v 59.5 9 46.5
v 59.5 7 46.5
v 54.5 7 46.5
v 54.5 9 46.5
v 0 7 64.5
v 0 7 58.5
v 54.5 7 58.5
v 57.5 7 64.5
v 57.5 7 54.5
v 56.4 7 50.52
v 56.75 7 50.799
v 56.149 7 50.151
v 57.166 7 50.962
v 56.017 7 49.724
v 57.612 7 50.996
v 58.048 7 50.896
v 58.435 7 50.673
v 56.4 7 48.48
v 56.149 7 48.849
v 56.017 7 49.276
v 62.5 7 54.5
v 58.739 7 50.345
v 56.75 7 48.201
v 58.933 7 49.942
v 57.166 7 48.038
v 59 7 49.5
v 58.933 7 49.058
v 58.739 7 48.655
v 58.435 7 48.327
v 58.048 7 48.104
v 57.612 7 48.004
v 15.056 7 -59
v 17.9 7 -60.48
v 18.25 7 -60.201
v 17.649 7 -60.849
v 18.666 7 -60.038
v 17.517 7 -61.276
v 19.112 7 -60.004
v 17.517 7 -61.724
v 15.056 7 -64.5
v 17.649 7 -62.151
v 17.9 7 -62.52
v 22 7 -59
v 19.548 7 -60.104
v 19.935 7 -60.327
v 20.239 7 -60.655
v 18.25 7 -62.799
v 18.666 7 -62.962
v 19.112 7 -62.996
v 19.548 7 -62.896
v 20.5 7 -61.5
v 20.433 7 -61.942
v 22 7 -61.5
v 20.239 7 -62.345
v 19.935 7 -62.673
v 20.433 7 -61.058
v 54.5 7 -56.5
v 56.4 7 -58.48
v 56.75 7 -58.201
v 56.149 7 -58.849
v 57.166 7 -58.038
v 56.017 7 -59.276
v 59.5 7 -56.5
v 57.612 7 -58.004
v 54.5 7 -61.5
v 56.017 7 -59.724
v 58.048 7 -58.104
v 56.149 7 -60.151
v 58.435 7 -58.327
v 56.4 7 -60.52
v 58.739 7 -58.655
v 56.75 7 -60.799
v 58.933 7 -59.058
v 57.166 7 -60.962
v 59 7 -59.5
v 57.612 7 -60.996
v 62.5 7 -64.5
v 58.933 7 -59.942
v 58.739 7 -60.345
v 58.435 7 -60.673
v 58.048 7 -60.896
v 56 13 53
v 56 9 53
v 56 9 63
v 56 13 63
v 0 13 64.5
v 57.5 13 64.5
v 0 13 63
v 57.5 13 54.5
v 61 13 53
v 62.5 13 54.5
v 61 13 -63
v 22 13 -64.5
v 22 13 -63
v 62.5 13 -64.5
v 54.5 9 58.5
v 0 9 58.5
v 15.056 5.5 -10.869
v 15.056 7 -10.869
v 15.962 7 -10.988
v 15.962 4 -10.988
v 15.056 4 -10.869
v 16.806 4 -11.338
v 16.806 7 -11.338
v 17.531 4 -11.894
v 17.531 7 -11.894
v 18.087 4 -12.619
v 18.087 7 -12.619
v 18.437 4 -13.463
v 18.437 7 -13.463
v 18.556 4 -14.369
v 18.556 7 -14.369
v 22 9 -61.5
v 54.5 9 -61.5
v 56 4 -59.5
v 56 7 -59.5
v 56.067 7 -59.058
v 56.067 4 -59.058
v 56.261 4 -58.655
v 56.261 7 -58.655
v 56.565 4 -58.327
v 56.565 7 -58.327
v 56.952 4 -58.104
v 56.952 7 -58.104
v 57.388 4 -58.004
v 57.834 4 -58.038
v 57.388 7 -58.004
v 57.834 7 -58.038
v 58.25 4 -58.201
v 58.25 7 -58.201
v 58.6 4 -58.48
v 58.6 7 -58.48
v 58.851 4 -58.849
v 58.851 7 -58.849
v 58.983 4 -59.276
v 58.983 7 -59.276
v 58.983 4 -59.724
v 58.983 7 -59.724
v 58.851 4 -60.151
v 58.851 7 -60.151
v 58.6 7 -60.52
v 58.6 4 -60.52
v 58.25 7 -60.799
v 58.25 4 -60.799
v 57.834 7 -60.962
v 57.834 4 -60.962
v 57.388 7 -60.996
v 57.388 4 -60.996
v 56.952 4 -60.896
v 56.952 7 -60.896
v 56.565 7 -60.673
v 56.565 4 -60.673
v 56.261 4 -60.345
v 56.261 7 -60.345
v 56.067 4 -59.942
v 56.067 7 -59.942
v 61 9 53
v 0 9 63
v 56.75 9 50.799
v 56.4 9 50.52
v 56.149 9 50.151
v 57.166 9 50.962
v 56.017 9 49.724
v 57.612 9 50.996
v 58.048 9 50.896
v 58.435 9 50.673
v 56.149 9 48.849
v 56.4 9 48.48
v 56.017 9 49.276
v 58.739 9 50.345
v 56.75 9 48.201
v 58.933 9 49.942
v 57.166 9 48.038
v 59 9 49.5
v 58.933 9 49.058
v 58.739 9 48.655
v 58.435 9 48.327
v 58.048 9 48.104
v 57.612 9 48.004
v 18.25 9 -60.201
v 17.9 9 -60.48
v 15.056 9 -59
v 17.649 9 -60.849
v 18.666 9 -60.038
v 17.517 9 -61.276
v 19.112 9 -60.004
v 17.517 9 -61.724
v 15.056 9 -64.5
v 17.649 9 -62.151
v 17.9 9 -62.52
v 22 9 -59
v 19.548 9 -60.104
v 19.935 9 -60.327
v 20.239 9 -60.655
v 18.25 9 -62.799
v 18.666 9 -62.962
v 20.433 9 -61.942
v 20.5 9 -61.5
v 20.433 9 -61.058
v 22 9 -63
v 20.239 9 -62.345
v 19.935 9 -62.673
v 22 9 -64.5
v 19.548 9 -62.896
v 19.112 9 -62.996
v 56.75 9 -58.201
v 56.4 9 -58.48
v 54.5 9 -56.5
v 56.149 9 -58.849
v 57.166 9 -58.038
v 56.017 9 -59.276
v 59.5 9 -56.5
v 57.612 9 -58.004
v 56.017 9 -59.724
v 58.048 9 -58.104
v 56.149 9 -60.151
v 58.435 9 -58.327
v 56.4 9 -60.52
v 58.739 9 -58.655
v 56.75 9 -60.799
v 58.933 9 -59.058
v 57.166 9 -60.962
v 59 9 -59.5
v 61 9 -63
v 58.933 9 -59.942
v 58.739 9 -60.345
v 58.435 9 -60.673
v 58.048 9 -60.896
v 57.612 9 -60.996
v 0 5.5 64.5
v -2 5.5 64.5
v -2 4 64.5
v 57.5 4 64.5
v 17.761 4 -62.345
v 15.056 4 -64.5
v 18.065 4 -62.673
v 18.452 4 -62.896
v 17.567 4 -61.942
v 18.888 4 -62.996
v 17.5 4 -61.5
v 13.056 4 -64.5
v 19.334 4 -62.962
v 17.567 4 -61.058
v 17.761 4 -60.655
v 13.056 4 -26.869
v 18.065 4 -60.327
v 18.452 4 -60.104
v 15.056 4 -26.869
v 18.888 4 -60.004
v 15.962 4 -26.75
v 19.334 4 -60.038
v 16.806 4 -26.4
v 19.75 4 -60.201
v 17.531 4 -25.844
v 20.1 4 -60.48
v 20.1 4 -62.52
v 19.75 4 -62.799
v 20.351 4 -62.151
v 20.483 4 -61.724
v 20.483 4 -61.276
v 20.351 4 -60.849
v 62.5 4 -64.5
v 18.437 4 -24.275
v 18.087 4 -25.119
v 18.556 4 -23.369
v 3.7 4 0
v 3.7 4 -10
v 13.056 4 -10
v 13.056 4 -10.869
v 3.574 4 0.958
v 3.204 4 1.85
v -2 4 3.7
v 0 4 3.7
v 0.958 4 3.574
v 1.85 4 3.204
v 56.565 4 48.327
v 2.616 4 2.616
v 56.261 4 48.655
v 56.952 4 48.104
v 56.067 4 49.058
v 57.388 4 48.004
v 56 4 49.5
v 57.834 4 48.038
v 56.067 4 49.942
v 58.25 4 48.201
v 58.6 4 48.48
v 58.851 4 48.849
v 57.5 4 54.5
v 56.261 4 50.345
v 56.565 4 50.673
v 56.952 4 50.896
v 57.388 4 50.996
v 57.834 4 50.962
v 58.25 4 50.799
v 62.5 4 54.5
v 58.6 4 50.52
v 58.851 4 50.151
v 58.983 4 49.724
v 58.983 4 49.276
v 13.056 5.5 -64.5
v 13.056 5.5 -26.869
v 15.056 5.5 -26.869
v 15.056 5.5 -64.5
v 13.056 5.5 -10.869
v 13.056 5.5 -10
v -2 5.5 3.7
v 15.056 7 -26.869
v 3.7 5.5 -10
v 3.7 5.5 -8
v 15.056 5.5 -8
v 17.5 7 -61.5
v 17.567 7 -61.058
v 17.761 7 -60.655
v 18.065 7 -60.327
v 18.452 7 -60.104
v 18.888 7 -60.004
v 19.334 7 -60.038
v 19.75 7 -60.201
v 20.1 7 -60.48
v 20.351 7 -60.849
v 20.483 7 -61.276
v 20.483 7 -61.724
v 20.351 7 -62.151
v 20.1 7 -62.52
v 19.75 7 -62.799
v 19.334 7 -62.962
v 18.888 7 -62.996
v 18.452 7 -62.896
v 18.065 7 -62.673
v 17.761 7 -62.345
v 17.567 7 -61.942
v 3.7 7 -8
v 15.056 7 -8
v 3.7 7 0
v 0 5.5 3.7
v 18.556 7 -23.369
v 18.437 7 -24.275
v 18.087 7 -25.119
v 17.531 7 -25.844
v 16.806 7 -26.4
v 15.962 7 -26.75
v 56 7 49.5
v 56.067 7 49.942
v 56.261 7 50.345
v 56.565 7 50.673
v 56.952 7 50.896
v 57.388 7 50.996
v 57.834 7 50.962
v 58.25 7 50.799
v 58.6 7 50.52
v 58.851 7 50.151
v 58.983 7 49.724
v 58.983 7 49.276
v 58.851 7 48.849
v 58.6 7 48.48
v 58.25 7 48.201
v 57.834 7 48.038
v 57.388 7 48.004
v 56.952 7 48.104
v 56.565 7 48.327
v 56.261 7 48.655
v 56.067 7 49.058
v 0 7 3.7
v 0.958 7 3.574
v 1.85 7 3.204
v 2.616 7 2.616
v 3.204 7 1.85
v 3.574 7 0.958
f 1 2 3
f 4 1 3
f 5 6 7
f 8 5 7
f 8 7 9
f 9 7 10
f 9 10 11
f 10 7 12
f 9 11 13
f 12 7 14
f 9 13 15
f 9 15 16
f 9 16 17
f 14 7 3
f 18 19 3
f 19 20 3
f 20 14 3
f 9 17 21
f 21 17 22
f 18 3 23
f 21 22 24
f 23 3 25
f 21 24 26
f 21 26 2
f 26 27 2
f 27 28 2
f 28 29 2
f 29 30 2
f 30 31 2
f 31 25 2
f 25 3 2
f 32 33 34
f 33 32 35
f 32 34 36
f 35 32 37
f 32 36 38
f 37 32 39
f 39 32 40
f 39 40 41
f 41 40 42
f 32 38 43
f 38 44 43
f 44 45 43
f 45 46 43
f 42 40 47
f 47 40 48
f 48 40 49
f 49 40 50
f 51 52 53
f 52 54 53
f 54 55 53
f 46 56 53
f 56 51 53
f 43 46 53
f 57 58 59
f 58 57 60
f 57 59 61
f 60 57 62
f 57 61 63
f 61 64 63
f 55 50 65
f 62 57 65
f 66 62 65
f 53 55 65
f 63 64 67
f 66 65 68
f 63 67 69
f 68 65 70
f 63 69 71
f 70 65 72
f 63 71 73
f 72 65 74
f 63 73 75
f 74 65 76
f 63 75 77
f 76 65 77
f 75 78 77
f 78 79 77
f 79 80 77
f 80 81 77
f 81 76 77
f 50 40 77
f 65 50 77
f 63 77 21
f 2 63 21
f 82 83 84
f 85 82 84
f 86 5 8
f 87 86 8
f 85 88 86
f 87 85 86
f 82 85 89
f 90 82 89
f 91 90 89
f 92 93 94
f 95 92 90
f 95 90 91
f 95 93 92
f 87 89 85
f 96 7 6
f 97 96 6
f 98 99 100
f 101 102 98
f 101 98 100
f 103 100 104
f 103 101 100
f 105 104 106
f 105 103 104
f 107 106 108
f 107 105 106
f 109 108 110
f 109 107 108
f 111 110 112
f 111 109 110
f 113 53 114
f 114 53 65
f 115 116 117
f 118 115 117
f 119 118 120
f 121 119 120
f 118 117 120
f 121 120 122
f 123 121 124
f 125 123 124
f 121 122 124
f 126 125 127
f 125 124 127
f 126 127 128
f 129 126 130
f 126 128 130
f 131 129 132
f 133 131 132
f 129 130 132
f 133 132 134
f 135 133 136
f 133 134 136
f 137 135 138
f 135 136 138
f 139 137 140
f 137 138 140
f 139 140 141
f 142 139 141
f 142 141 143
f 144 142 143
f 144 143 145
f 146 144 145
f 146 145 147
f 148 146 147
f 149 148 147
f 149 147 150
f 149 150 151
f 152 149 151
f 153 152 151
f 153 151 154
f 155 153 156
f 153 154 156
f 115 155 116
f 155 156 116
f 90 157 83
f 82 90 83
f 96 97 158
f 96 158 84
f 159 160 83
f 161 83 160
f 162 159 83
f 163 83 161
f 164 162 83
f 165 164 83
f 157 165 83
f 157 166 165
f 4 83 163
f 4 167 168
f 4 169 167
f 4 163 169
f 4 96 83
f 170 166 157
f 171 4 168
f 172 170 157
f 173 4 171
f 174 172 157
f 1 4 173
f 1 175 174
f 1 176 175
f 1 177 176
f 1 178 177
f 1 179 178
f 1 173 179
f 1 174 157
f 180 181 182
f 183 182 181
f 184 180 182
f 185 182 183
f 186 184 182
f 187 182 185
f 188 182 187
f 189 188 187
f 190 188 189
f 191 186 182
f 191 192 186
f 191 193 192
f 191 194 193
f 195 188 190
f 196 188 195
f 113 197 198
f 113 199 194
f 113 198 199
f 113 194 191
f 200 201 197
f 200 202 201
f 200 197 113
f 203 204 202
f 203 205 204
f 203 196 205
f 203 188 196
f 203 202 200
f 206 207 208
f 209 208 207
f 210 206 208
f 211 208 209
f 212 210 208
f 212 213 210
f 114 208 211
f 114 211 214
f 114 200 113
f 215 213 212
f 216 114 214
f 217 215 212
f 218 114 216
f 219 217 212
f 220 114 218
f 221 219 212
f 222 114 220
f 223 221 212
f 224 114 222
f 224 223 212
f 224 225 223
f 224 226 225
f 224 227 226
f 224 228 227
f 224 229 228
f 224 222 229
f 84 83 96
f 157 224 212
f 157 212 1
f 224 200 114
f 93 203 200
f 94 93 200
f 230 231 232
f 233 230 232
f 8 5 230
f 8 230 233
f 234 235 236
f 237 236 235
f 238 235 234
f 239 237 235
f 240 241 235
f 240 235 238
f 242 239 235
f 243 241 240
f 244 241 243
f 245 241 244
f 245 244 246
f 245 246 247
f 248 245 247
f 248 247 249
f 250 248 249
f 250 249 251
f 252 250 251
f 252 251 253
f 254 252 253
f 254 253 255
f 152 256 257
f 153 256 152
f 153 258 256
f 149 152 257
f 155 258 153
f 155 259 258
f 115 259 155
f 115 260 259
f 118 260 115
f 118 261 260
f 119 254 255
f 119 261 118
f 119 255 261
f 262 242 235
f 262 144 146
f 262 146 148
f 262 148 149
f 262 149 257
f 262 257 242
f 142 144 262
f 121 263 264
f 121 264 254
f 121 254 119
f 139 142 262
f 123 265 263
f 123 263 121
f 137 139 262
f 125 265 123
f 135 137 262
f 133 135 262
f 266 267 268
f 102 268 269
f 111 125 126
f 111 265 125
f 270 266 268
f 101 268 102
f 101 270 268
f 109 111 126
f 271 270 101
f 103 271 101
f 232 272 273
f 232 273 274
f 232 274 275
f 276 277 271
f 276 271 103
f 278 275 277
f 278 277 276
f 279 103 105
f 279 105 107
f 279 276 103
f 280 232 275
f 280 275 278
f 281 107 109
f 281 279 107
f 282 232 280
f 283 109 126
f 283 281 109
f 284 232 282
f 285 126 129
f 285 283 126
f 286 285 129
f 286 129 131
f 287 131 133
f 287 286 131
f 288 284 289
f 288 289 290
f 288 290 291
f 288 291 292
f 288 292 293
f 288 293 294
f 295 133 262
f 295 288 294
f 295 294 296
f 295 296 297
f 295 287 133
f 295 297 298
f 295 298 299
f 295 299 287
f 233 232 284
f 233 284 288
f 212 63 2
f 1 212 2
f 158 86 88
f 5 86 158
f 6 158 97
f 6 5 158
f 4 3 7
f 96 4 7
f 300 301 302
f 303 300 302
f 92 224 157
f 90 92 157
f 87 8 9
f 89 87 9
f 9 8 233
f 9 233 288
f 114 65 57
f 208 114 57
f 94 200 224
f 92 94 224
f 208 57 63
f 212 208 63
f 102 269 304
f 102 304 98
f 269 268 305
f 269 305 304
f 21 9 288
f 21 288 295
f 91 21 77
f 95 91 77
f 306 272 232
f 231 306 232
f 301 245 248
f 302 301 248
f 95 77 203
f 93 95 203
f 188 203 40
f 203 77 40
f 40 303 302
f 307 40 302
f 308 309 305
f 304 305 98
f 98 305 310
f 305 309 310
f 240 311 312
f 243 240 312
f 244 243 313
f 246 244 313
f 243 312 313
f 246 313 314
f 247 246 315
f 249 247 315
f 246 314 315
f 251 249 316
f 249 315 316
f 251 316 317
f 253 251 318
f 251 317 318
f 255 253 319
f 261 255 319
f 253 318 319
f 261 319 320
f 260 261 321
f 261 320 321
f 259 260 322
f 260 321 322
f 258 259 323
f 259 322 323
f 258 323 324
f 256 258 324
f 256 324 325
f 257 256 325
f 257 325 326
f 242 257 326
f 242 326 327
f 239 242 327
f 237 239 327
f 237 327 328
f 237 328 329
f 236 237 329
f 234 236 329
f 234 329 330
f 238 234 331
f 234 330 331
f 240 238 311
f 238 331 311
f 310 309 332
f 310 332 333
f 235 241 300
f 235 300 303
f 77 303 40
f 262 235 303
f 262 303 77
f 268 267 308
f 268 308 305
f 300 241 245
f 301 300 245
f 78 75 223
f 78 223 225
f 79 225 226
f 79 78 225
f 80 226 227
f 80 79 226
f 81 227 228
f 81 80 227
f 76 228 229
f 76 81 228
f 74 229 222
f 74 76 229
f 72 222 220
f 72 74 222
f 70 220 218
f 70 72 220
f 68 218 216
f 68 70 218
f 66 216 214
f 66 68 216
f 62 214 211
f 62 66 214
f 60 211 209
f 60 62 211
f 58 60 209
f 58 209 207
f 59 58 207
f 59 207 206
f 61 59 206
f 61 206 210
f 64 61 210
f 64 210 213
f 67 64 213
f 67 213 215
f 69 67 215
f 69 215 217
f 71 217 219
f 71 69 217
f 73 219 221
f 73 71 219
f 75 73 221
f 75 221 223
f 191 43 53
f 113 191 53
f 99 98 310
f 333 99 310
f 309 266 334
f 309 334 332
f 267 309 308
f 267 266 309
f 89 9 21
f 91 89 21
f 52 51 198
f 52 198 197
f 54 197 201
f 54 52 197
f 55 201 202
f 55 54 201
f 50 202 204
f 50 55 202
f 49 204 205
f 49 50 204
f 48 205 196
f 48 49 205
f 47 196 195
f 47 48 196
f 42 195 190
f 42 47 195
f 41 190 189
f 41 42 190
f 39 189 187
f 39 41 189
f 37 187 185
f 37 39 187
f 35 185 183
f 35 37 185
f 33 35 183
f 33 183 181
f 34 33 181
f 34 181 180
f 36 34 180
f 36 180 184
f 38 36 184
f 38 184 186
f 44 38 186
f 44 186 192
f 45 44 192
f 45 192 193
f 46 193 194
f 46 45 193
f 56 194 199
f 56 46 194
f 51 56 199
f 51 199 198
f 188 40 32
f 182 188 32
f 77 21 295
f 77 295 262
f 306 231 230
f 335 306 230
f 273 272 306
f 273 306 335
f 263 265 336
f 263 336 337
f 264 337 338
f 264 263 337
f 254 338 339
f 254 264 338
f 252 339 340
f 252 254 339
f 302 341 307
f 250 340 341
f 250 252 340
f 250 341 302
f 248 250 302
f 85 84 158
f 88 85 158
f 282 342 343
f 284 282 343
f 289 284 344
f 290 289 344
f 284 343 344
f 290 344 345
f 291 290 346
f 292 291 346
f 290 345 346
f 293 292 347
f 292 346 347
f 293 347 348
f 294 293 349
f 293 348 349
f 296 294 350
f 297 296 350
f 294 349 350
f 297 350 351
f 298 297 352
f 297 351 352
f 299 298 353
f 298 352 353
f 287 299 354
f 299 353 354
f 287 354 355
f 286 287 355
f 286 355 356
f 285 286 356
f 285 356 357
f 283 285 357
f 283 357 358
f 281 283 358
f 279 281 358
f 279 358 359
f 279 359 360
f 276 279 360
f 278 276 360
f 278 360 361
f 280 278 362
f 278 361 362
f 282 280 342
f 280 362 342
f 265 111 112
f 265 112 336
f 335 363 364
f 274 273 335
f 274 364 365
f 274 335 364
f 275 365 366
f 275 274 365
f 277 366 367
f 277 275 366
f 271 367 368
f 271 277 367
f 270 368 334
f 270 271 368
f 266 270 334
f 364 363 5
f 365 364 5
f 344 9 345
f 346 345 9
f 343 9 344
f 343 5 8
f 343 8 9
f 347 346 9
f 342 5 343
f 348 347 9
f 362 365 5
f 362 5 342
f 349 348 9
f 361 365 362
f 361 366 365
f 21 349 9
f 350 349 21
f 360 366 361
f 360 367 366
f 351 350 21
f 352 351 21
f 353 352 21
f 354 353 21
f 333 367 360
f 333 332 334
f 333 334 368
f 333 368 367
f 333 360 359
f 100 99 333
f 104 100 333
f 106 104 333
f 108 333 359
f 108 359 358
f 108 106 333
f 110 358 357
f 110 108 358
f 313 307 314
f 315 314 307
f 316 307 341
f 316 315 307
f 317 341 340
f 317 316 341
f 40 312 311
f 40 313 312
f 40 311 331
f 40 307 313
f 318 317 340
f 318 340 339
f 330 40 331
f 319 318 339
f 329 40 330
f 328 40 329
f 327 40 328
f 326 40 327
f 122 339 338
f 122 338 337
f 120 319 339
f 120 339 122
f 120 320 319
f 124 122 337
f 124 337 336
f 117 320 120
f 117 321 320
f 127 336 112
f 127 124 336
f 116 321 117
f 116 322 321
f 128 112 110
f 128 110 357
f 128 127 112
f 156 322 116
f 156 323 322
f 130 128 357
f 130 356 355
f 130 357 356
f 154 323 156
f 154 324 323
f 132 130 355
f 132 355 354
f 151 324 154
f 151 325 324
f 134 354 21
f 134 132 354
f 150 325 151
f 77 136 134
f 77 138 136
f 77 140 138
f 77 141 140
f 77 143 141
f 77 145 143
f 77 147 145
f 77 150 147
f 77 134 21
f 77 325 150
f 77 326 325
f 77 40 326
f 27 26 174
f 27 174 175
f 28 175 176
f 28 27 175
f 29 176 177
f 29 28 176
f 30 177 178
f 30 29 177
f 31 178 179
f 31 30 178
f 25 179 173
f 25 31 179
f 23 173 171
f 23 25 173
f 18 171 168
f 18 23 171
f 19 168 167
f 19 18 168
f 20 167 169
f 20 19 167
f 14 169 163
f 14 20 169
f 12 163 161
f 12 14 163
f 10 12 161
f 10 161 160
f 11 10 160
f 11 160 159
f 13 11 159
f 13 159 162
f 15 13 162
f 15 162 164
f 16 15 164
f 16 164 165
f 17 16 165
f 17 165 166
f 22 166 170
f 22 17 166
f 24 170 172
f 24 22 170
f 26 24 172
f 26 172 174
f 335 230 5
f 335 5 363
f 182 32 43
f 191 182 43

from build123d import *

# Parameters (mm, degrees)
SKETCH2_R                 = 1.5
BOSS_EXTRUDE1_DEPTH       = 3
BOSS_EXTRUDE2_DEPTH       = 6
BOSS_EXTRUDE2_2_OUTLINE_R = 1.5
BOSS_EXTRUDE2_2_DEPTH     = 2
CUT_EXTRUDE1_DEPTH        = 10
CUT_EXTRUDE2_DEPTH        = 20
SKETCH6_W                 = 2
SKETCH6_H                 = 37.630998281
SKETCH6_H_2               = 60.8
EXTRUDE_THIN1_DEPTH       = 1.5


# Read off the part's stored shape, not the designer's step: Boss-Extrude2
with BuildPart() as part:
    # Sketch2 → Boss-Extrude1 (new body)
    with BuildSketch(Plane(origin=(0, 7, 0), x_dir=(1, 0, 0), z_dir=(0, 1, 0))):
        Polygon((-57.5, -54.5), (-57.5, -64.5), (57.5, -64.5), (57.5, -54.5), (62.5, -54.5), (62.5, 64.5), (-62.5, 64.5), (-62.5, -54.5), align=None)
        with BuildLine():
            ThreePointArc((-57.185427384, -50.966643811), (-57.444119701, -50.998958769), (-57.7045, -50.985994532))
            ThreePointArc((-57.7045, -50.985994532), (-59, -49.5), (-57.7045, -48.014005468))
            ThreePointArc((-57.7045, -48.014005468), (-57.444119701, -48.001041231), (-57.185427384, -48.033356189))
            ThreePointArc((-57.185427384, -48.033356189), (-56, -49.5), (-57.185427384, -50.966643811))
        make_face(mode=Mode.SUBTRACT)
        with Locations(Location((57.5, -49.5, 0), (0, 0, 180))):
            Circle(SKETCH2_R, mode=Mode.SUBTRACT)
        with Locations(Location((-57.5, 59.5, 0), (0, 0, 180))):
            Circle(SKETCH2_R, mode=Mode.SUBTRACT)
        with Locations(Location((-19, 61.5, 0), (0, 0, 180))):
            Circle(SKETCH2_R, mode=Mode.SUBTRACT)
        with Locations(Location((19, 61.5, 0), (0, 0, 180))):
            Circle(SKETCH2_R, mode=Mode.SUBTRACT)
        with Locations(Location((57.5, 59.5, 0), (0, 0, 180))):
            Circle(SKETCH2_R, mode=Mode.SUBTRACT)
    extrude(amount=-BOSS_EXTRUDE1_DEPTH)

    # Sketch4 → Cut-Extrude1 (cut)
    with BuildSketch(Plane.XZ.offset(-4)):
        with BuildLine():
            Line((-3.7, -8), (-3.7, 0))
            ThreePointArc((-3.7, 0), (0, 3.7), (3.7, 0))
            Line((3.7, 0), (3.7, -8))
            ThreePointArc((3.7, -8), (0, -11.7), (-3.7, -8))
        make_face()
        with BuildLine():
            Line((11.55579566, -23.369001719), (11.55579566, -14.369001719))
            ThreePointArc((11.55579566, -14.369001719), (15.05579566, -10.869001719), (18.55579566, -14.369001719))
            Line((18.55579566, -14.369001719), (18.55579566, -23.369001719))
            ThreePointArc((18.55579566, -23.369001719), (15.05579566, -26.869001719), (11.55579566, -23.369001719))
        make_face()
    extrude(amount=-CUT_EXTRUDE1_DEPTH, mode=Mode.SUBTRACT)


with BuildPart() as body_2:
    # Boss-Extrude2 outline → Boss-Extrude2 (new body)
    with BuildSketch(Plane(origin=(0, 7, 0), x_dir=(1, 0, 0), z_dir=(0, 1, 0))):
        Polygon((-61, 63), (-22, 63), (-22, 64.5), (-62.5, 64.5), (-62.5, -54.5), (-57.5, -54.5), (-57.5, -64.5), (57.5, -64.5), (57.5, -54.5), (62.5, -54.5), (62.5, 64.5), (22, 64.5), (22, 63), (61, 63), (61, -53), (56, -53), (56, -63), (-56, -63), (-56, -53), (-61, -53), align=None)
    extrude(amount=BOSS_EXTRUDE2_DEPTH)

    # Boss-Extrude2 2 outline → Boss-Extrude2 2 (add)
    with BuildSketch(Plane(origin=(0, 7, 0), x_dir=(1, 0, 0), z_dir=(0, 1, 0))):
        Polygon((-22, 64.5), (-22, 63), (-61, 63), (-61, -53), (-56, -53), (-56, -63), (56, -63), (56, -53), (61, -53), (61, 63), (22, 63), (22, 64.5), align=None)
        with Locations((-57.5, -49.5)):
            Circle(BOSS_EXTRUDE2_2_OUTLINE_R, mode=Mode.SUBTRACT)
        with Locations((57.5, -49.5)):
            Circle(BOSS_EXTRUDE2_2_OUTLINE_R, mode=Mode.SUBTRACT)
        with Locations((-57.5, 59.5)):
            Circle(BOSS_EXTRUDE2_2_OUTLINE_R, mode=Mode.SUBTRACT)
        with Locations((-19, 61.5)):
            Circle(BOSS_EXTRUDE2_2_OUTLINE_R, mode=Mode.SUBTRACT)
        Polygon((-22, 61.5), (-22, 59), (22, 59), (22, 61.5), (54.5, 61.5), (54.5, 56.5), (59.5, 56.5), (59.5, -46.5), (54.5, -46.5), (54.5, -58.5), (-54.5, -58.5), (-54.5, -46.5), (-59.5, -46.5), (-59.5, 56.5), (-54.5, 56.5), (-54.5, 61.5), align=None, mode=Mode.SUBTRACT)
        with Locations((19, 61.5)):
            Circle(BOSS_EXTRUDE2_2_OUTLINE_R, mode=Mode.SUBTRACT)
        with Locations((57.5, 59.5)):
            Circle(BOSS_EXTRUDE2_2_OUTLINE_R, mode=Mode.SUBTRACT)
    extrude(amount=BOSS_EXTRUDE2_2_DEPTH)


with BuildPart() as cut_extrude2_tool:
    # Sketch5 → Cut-Extrude2 (new body)
    with BuildSketch(Plane.XZ.offset(-4)):
        Polygon((15.05579566, -18.869001719), (15.05579566, -64.5), (-62.5, -64.5), (-62.5, 54.5), (-57.5, 54.5), (-57.5, 64.5), (0, 64.5), (0, -8), (15.05579566, -8), align=None)
    extrude(amount=-CUT_EXTRUDE2_DEPTH)


with BuildPart() as part_1:
    add(part.part)

    # Cut-Extrude2: cut by cut_extrude2_tool
    add(cut_extrude2_tool.part, mode=Mode.SUBTRACT)

    # Sketch6 → Extrude-Thin1 (add)
    with BuildSketch(Plane.XZ.offset(-4)):
        with Locations((14.05579566, -45.68450086)):
            Rectangle(SKETCH6_W, SKETCH6_H)
        Polygon((15.05579566, -10.869001719), (15.05579566, -8), (3.7, -8), (3.7, -10), (13.05579566, -10), (13.05579566, -10.869001719), align=None)
        with Locations((-1, 34.1)):
            Rectangle(SKETCH6_W, SKETCH6_H_2)
    extrude(amount=-EXTRUDE_THIN1_DEPTH)


with BuildPart() as body_2_1:
    add(body_2.part)

    # Cut-Extrude2: cut by cut_extrude2_tool
    add(cut_extrude2_tool.part, mode=Mode.SUBTRACT)


solid = Compound([part_1.part, body_2_1.part])
